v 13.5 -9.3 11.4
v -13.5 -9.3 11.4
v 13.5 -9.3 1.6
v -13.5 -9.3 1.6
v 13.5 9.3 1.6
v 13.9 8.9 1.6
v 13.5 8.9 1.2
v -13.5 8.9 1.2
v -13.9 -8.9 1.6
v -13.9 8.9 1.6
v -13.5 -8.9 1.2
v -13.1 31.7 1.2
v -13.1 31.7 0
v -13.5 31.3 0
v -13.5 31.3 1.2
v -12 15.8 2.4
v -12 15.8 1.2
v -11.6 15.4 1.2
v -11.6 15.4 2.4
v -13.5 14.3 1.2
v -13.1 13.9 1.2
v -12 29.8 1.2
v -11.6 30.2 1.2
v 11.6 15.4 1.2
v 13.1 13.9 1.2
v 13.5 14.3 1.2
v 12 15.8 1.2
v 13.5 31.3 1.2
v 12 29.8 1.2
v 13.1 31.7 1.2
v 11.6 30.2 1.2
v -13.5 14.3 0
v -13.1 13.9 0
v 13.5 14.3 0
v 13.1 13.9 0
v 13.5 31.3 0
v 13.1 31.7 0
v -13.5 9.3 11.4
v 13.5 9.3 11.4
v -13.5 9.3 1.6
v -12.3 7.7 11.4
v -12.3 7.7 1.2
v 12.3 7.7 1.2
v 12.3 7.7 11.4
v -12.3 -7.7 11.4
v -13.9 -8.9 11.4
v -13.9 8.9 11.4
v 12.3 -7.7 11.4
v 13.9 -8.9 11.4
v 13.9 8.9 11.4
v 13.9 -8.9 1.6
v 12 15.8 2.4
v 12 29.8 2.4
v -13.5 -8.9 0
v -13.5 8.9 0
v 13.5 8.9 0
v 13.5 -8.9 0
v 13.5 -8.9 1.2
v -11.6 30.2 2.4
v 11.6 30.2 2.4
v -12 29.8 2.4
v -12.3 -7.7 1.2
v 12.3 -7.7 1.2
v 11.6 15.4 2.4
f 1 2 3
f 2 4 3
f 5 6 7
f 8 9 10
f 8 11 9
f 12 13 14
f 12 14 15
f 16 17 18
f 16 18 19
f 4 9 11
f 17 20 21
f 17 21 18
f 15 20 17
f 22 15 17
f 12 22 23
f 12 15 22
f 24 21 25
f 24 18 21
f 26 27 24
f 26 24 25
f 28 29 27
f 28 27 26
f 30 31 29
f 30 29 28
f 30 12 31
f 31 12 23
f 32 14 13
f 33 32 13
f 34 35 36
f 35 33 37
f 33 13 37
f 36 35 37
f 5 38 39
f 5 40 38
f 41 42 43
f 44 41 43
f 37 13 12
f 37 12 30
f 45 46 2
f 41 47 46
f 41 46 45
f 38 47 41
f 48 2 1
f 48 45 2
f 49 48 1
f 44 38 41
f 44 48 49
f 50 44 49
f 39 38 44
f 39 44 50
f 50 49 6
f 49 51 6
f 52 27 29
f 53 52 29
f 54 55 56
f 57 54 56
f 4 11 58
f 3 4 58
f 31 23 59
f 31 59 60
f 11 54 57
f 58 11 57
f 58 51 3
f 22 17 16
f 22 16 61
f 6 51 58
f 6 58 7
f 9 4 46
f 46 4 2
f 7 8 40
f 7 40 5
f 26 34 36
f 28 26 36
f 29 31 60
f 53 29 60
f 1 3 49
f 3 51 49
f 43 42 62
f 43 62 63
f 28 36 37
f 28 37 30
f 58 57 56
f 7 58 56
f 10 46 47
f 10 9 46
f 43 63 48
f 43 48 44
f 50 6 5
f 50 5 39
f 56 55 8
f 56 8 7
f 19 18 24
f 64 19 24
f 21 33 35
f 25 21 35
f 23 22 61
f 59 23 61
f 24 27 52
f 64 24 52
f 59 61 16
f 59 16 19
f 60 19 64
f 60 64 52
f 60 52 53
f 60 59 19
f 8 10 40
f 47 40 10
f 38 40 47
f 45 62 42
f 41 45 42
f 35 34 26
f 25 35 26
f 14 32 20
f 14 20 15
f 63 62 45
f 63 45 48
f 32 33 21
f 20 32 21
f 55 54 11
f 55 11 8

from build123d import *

# Parameters (mm, degrees)
F0_W      = 27
F0_H      = 17.8
F1_DEPTH  = 1.2
F2_W      = 27.8
F2_H      = 18.6
F2_W_2    = 27
F2_H_2    = 17.8
F2_W_3    = 24.6
F2_H_3    = 15.4
F3_DEPTH  = 10.2
F4_W      = 24
F4_H      = 14.8
F5_DEPTH  = 1.2
F6_SIZE   = 0.39999
F6_2_SIZE = 0.39999


# Not quite as in the source:
# - a fillet or chamfer is up to 0.001 mm smaller than in the source, because OpenCascade refuses the exact size


with BuildPart() as f1:
    # F0 (on Top) → F1 (new body)
    with BuildSketch(Plane.XY):
        Rectangle(F0_W, F0_H)
    extrude(amount=F1_DEPTH)

    # F2 (on face) → F3 (join)
    with BuildSketch(Plane.XY.offset(1.2)):
        Rectangle(F2_W, F2_H)
        Rectangle(F2_W_2, F2_H_2, mode=Mode.SUBTRACT)
        Rectangle(F2_W_2, F2_H_2)
        Rectangle(F2_W_3, F2_H_3, mode=Mode.SUBTRACT)
    extrude(amount=F3_DEPTH)

    # F6 (size 0.4 in the source; OpenCascade refuses exactly that, so slightly less here)
    f6_edges = [f1.edges().sort_by_distance(p)[0] for p in [
        (-13.9, 0, 1.2),
        (-13.9, -9.3, 6.3),
        (-13.9, 9.3, 6.3),
        (13.9, -9.3, 6.3),
        (13.9, 0, 1.2),
        (13.9, 9.3, 6.3),
        (0, 9.3, 1.2),
        (0, -9.3, 1.2),
    ]]
    chamfer(f6_edges, length=F6_SIZE)


with BuildPart() as f1b:
    # F0 (on Top) → F1, piece 2 (new body)
    with BuildSketch(Plane.XY):
        with Locations((0, 22.8)):
            Rectangle(F0_W, F0_H)
    extrude(amount=F1_DEPTH)

    # F4 (on face) → F5 (join)
    with BuildSketch(Plane.XY.offset(1.2)):
        with Locations((0, 22.8)):
            Rectangle(F4_W, F4_H)
    extrude(amount=F5_DEPTH)

    # F6#2 (size 0.4 in the source; OpenCascade refuses exactly that, so slightly less here)
    f6_2_edges = [f1b.edges().sort_by_distance(p)[0] for p in [
        (13.5, 31.7, 0.6),
        (12, 30.2, 1.8),
        (12, 15.4, 1.8),
        (13.5, 13.9, 0.6),
        (-13.5, 31.7, 0.6),
        (-12, 30.2, 1.8),
        (-13.5, 13.9, 0.6),
        (-12, 15.4, 1.8),
    ]]
    chamfer(f6_2_edges, length=F6_2_SIZE)


solid = Compound([f1.part, f1b.part])
